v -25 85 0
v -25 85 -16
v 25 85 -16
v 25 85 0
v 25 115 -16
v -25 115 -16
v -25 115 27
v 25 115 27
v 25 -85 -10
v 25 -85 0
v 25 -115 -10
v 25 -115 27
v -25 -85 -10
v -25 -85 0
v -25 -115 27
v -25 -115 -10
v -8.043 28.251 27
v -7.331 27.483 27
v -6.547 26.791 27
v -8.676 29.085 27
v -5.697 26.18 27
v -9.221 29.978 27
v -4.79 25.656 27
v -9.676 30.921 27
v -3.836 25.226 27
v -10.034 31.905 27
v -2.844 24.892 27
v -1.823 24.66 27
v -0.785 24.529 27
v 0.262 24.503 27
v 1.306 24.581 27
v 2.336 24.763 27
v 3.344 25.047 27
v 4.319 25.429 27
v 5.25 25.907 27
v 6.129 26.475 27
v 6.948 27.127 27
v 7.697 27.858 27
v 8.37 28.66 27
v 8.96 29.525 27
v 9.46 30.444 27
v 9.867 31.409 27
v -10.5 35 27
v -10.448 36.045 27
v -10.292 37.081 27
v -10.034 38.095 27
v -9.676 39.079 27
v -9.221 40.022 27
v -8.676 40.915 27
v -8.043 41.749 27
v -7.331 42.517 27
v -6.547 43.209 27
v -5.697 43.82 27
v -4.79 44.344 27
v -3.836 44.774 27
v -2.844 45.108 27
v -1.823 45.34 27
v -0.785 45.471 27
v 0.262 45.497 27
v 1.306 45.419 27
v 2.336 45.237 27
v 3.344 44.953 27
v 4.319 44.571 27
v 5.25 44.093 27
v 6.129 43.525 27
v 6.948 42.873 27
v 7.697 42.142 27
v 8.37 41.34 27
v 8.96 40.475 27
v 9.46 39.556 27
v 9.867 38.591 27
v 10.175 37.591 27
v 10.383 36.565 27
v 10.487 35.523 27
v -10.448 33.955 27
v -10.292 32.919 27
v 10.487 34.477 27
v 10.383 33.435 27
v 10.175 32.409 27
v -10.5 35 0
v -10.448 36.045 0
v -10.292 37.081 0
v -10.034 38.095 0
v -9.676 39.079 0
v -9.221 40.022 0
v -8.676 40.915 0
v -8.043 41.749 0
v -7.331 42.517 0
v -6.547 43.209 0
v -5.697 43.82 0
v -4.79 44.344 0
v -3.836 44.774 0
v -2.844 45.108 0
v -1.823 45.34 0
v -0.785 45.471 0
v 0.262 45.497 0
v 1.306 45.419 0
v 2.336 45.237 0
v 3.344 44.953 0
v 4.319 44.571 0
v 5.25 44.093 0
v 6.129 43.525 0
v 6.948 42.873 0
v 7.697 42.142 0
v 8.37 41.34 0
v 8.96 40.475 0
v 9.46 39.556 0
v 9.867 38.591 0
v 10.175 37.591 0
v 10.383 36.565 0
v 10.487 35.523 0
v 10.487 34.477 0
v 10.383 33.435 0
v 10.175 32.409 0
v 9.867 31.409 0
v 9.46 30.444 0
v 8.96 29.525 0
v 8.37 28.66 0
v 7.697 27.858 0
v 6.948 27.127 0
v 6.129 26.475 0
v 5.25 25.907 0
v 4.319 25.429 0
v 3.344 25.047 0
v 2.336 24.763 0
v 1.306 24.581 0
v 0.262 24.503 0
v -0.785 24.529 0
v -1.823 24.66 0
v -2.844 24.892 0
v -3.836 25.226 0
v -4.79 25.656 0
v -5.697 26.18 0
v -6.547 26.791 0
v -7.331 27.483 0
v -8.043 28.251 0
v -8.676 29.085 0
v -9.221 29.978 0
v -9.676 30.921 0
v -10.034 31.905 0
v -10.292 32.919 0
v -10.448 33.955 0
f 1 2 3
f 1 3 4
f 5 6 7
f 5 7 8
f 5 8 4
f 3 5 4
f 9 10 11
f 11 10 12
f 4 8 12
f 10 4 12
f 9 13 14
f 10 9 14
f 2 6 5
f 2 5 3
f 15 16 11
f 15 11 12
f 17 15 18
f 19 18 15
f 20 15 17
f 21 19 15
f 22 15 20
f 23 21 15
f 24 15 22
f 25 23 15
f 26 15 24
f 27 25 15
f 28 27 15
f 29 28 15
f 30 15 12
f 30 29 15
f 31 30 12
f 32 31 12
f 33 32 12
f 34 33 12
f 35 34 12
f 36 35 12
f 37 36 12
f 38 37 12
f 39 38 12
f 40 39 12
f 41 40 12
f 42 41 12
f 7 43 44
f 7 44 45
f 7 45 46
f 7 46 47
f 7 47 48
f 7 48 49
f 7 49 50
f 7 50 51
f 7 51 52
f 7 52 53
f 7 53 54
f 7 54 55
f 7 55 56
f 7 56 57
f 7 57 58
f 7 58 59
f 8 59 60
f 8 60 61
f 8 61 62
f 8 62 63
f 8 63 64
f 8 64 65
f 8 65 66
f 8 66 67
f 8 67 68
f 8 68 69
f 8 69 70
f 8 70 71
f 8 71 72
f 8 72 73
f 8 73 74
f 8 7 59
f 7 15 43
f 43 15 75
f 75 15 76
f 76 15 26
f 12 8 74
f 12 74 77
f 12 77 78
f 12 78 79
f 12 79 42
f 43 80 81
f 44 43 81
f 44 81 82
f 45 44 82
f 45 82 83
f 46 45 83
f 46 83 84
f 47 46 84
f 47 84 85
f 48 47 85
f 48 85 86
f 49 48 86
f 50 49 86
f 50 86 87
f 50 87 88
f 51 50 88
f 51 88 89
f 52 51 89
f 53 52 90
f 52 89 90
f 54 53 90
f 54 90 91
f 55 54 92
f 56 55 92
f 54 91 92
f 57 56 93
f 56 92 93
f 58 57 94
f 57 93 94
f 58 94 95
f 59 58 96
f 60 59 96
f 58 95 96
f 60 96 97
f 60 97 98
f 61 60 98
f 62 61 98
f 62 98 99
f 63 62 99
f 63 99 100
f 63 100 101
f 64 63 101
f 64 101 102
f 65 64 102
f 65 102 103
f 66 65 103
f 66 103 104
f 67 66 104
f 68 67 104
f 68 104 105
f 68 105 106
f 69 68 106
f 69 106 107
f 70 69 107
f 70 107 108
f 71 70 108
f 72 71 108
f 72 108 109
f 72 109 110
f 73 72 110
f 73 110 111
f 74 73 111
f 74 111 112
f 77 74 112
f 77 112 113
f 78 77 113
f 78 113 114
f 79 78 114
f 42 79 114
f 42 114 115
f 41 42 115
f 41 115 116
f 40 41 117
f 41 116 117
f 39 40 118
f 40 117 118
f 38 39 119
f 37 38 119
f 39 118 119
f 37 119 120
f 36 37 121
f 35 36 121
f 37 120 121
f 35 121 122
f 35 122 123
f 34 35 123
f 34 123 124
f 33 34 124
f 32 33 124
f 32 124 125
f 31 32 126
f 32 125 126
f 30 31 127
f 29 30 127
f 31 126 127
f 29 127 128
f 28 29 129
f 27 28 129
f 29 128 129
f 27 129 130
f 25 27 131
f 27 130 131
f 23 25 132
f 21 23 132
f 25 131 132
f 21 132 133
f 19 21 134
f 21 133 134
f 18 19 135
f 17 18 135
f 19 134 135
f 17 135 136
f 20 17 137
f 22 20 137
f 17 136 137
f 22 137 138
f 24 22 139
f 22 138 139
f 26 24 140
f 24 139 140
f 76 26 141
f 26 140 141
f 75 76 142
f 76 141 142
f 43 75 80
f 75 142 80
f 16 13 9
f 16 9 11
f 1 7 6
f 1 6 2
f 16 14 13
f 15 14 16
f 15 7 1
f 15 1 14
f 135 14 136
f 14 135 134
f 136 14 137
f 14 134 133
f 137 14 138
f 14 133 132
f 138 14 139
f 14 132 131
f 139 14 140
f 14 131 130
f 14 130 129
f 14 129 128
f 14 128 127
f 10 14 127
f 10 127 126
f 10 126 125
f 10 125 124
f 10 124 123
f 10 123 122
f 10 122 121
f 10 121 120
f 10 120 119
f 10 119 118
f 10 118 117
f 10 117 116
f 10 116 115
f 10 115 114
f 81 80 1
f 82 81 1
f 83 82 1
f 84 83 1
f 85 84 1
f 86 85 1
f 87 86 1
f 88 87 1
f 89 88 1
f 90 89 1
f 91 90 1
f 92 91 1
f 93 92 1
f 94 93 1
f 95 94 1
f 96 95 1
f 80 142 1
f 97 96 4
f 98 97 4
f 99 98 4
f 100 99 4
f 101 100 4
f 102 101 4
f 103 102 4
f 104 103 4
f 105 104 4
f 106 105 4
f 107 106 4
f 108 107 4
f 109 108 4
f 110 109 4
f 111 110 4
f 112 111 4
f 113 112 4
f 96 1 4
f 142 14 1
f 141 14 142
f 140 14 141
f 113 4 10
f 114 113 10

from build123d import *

# Parameters (mm, degrees)
F0_W     = 50
F0_H     = 230
F1_DEPTH = 27
F2_W     = 30
F2_H     = 10
F2_H_2   = 16
F3_DEPTH = 50
F5_D     = 21


with BuildPart() as f1:
    # F0 (on Top) → F1 (new body)
    with BuildSketch(Plane.XY):
        Rectangle(F0_W, F0_H)
    extrude(amount=F1_DEPTH)

    # F2 (on face) → F3 (join, through all)
    with BuildSketch(Plane(origin=(-25, 0, 0), x_dir=(0, -1, 0), z_dir=(-1, 0, 0))):
        with Locations((100, -5)):
            Rectangle(F2_W, F2_H)
        with Locations((-100, -8)):
            Rectangle(F2_W, F2_H_2)
    extrude(amount=-F3_DEPTH)

    # F5 (through all)
    with Locations(Plane.XY.offset(27)):
        with Locations((0, 35)):
            Hole(F5_D / 2)


solid = f1.part
